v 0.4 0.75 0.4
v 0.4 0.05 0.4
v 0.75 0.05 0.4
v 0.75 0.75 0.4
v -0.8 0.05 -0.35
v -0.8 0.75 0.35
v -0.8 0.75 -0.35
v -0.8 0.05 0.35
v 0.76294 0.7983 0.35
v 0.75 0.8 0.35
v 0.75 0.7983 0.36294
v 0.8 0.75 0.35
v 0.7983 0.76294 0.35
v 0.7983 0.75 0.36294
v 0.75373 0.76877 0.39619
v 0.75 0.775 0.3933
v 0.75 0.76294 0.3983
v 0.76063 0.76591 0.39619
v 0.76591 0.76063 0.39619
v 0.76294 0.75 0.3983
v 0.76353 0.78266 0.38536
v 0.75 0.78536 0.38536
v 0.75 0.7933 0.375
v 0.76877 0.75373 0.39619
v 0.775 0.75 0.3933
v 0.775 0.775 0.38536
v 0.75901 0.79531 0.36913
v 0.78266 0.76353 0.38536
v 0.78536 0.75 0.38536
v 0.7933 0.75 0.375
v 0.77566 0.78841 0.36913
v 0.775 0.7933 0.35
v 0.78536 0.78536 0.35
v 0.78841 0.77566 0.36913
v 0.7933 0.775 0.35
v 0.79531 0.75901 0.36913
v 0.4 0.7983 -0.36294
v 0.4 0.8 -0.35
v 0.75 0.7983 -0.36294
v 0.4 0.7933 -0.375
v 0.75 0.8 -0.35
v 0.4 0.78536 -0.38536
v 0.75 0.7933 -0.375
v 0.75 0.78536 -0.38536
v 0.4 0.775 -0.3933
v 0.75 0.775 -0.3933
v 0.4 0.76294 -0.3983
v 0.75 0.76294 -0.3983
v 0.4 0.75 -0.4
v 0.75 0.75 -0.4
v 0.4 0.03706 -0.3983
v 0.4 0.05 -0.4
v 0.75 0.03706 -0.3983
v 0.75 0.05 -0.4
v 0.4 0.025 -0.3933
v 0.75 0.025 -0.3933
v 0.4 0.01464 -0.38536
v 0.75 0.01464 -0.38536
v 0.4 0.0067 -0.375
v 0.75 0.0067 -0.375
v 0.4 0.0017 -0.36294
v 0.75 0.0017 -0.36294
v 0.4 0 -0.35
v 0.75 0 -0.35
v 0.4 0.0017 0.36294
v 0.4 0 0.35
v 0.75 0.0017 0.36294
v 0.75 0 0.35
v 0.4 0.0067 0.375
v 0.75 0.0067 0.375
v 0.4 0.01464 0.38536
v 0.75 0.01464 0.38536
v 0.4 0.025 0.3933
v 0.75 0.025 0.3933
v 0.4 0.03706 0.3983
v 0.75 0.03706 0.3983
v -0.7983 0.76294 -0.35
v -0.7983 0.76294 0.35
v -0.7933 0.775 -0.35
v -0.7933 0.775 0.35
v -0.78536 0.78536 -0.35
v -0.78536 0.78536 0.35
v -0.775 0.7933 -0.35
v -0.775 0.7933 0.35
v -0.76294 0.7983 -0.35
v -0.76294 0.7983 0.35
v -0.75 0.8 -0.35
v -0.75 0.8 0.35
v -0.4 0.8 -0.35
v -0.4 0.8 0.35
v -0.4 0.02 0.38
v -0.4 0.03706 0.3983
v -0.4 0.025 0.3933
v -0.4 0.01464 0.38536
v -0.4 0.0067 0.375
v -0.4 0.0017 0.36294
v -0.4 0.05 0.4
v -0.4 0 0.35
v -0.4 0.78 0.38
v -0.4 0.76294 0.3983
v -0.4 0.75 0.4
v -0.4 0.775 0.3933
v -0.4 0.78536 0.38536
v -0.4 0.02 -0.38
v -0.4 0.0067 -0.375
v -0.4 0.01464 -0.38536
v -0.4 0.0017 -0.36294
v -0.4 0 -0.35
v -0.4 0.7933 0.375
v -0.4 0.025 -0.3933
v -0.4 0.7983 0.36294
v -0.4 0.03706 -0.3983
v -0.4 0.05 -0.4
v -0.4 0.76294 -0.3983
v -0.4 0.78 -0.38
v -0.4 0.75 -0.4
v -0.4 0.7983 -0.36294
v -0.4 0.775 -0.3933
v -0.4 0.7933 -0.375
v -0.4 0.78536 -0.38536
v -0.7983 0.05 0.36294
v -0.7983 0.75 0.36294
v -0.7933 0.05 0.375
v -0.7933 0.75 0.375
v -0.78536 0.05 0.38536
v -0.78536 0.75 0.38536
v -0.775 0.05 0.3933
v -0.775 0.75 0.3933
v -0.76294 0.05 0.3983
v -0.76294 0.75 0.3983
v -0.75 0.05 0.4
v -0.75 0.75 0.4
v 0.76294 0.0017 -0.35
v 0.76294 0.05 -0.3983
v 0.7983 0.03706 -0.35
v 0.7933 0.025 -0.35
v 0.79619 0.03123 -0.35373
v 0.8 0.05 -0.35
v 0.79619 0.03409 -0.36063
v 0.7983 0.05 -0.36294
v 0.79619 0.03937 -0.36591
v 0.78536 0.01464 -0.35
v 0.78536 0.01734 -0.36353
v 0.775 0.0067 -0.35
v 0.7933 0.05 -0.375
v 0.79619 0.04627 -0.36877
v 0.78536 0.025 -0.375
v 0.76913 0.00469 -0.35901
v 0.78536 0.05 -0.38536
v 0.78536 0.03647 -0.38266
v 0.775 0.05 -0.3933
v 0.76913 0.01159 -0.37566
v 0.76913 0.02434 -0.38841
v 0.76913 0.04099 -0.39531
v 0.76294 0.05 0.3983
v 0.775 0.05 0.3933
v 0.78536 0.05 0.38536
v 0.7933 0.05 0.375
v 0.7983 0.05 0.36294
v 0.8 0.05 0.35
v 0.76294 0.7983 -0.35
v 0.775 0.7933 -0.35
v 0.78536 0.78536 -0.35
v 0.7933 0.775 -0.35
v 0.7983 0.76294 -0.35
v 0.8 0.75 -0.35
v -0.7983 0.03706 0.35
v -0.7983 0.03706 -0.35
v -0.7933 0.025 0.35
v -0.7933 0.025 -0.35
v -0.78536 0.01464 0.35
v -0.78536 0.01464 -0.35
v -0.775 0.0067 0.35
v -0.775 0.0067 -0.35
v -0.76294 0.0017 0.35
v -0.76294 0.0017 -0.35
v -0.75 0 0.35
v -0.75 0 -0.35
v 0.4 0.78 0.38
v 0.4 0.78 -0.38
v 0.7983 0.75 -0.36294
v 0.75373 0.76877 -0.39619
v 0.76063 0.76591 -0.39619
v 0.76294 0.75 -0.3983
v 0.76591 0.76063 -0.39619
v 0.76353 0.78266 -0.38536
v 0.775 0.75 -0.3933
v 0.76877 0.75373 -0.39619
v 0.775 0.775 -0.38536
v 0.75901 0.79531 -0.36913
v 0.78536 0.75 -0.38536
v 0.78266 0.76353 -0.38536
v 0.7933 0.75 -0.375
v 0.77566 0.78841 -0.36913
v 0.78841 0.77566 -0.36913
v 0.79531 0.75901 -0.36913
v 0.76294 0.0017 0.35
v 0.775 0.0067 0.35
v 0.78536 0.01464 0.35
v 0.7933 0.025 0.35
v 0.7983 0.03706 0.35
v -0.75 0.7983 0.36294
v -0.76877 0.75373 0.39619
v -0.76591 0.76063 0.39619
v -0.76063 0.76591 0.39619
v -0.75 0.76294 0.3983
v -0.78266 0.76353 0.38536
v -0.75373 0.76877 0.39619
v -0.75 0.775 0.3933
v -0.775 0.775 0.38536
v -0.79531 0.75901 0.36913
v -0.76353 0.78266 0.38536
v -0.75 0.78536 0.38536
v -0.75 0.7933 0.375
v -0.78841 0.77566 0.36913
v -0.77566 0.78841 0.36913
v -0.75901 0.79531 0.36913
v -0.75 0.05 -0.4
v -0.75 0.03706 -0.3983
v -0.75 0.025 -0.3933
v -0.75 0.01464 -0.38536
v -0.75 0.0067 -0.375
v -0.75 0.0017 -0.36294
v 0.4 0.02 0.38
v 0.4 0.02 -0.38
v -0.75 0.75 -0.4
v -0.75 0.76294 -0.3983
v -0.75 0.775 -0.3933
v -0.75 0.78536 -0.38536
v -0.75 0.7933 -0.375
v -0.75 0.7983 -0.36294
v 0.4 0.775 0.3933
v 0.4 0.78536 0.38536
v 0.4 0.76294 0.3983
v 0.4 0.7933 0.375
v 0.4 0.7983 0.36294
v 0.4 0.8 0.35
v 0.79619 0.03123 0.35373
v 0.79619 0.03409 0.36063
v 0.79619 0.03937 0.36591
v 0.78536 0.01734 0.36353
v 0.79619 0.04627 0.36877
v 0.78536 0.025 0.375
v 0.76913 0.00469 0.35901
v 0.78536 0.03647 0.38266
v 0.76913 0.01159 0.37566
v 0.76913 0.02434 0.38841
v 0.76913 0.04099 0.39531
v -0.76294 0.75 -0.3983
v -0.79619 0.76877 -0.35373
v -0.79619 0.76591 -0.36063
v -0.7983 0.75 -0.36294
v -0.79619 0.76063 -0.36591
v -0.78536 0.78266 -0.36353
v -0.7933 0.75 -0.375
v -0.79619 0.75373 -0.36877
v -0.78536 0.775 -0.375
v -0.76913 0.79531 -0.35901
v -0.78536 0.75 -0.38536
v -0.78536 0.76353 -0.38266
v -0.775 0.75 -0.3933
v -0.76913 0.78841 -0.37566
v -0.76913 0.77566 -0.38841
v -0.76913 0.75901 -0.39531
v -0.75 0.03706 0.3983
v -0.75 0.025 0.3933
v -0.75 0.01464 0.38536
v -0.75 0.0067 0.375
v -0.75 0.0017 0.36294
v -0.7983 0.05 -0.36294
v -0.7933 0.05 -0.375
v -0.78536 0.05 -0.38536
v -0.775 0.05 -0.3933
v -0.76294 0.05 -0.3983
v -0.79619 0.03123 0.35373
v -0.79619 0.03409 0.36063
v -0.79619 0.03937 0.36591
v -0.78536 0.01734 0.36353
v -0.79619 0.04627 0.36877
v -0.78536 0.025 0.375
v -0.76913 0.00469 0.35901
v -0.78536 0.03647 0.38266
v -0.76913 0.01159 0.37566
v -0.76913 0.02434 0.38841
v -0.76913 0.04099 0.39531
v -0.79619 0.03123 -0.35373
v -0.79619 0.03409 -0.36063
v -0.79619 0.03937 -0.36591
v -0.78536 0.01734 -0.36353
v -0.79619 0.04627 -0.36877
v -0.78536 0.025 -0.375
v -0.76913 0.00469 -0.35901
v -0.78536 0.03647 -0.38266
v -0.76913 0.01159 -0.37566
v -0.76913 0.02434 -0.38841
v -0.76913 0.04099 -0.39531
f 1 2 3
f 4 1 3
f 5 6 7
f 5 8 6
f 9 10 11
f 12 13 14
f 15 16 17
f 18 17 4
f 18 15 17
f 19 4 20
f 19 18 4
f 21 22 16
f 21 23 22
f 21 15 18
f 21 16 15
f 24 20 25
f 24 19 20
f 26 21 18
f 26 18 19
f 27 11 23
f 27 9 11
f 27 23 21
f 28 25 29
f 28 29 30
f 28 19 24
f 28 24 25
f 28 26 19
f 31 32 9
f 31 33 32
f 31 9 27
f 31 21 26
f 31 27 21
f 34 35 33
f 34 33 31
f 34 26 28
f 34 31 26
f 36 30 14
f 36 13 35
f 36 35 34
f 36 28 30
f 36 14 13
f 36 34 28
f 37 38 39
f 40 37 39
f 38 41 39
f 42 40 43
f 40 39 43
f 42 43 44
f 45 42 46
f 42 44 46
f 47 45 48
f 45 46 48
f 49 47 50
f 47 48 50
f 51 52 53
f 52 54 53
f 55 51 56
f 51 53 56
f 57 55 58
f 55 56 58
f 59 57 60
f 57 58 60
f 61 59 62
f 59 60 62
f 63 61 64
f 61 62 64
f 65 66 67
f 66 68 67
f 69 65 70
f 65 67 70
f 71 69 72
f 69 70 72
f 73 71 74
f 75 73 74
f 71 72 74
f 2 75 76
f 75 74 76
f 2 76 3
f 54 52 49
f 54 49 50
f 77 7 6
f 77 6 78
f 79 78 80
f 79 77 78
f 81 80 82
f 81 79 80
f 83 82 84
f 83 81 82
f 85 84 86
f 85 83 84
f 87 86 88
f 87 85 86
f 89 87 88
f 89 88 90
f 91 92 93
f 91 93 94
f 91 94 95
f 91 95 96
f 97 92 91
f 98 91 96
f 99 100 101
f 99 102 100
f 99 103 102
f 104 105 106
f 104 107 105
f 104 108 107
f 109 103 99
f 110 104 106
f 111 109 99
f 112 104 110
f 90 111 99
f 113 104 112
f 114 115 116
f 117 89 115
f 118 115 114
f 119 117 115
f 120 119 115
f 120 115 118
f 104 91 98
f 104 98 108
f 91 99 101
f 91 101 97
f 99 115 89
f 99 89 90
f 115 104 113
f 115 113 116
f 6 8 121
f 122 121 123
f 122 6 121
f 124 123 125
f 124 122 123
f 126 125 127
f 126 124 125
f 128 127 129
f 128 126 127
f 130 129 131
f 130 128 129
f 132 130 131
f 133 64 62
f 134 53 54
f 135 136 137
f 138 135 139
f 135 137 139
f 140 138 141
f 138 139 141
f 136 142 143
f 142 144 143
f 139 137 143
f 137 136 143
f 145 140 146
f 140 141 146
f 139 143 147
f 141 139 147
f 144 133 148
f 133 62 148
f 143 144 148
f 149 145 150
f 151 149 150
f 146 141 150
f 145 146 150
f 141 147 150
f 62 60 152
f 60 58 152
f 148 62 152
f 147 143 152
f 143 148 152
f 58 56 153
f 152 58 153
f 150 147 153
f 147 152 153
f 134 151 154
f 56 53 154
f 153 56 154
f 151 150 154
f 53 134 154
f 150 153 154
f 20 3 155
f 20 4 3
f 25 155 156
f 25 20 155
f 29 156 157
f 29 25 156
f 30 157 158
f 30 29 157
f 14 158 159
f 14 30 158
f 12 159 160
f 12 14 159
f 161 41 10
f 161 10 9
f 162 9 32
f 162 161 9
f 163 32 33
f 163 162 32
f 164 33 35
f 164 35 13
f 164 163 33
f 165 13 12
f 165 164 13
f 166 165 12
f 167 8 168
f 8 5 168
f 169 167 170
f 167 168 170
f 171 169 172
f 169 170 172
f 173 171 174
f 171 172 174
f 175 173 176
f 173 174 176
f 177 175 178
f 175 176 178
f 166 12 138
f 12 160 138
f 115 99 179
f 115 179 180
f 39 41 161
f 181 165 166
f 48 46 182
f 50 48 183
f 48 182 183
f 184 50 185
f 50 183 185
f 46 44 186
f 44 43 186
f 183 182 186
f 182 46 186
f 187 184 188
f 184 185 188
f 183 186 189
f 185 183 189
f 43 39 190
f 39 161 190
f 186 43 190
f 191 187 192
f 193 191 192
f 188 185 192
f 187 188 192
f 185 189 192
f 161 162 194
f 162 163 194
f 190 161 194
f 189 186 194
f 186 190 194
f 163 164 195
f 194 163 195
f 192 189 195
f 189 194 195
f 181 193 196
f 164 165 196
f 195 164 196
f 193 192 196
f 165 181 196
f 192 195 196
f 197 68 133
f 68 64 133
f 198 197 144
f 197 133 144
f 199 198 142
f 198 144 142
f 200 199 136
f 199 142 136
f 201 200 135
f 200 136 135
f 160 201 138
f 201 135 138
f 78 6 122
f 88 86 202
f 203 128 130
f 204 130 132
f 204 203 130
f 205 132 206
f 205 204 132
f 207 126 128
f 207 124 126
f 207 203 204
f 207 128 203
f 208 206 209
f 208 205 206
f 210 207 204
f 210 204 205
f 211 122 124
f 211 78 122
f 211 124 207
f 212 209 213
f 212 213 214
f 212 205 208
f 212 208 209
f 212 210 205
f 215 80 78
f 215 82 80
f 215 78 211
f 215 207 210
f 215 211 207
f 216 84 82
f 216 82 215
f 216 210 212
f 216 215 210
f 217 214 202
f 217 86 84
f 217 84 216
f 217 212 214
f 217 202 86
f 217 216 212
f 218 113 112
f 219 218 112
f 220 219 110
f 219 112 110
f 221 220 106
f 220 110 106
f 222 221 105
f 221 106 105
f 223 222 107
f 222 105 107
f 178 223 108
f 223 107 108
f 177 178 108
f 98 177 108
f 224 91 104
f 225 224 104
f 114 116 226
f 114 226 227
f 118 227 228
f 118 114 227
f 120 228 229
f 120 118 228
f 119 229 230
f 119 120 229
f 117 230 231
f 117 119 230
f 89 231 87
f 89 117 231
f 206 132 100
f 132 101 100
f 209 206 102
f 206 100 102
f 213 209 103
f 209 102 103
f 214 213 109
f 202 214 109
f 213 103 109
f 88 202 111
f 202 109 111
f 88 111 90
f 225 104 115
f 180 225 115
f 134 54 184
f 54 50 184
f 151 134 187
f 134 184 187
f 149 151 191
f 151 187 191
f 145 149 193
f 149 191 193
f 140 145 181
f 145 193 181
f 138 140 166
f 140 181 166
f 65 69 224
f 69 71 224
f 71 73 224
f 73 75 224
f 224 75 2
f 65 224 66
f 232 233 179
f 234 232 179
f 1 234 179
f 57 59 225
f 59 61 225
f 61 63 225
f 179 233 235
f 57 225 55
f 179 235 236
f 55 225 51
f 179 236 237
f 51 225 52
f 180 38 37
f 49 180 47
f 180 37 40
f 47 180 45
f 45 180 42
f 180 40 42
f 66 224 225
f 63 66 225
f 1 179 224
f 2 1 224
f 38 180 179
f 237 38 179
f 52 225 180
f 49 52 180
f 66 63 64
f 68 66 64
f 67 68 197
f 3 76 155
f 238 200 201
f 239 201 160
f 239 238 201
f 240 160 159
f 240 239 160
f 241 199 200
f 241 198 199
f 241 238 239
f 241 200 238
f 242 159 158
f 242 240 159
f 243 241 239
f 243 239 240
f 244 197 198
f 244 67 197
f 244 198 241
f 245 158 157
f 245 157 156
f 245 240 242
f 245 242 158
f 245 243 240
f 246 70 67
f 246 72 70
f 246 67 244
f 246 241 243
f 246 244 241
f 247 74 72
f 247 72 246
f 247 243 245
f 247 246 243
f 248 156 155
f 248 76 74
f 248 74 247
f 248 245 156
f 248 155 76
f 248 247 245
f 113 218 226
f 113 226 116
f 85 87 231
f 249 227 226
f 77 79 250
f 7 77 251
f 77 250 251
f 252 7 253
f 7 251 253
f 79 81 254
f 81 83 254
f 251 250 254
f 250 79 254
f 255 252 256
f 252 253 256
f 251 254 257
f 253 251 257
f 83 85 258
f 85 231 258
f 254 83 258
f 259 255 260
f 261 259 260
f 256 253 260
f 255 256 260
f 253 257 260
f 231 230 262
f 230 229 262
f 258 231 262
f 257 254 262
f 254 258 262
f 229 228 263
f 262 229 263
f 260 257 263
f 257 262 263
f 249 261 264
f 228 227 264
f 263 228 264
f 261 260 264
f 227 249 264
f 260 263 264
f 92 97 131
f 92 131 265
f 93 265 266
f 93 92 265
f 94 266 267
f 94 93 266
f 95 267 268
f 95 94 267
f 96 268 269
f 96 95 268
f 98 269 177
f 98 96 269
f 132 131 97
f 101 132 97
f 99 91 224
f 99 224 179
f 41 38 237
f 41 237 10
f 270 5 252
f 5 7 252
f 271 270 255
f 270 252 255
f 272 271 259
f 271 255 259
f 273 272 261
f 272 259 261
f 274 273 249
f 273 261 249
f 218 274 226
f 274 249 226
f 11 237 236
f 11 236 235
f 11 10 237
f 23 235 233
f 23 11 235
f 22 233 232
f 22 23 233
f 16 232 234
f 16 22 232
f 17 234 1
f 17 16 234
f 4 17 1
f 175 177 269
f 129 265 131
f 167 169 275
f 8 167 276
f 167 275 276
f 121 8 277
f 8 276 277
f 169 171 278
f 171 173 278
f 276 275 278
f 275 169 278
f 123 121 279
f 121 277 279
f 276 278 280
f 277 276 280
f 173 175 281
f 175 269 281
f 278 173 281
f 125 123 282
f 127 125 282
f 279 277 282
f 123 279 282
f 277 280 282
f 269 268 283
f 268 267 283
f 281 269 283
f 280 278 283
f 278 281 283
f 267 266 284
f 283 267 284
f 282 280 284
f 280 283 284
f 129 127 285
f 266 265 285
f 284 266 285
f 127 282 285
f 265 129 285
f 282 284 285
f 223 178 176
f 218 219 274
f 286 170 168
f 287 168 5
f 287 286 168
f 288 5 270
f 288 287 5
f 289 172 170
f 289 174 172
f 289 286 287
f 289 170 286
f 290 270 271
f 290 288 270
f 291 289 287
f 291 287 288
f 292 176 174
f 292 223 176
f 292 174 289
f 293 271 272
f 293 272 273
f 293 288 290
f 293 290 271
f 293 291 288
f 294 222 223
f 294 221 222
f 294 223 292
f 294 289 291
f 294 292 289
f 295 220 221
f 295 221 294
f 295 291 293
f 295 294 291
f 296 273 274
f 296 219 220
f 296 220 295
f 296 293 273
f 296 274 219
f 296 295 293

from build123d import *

# Parameters (mm, degrees)
SKETCH1_W               = 1.6
SKETCH1_H               = 0.8
BOSS_EXTRUDE1_DEPTH     = 0.8
CUT_EXTRUDE1_DEPTH      = 0.4
CUT_EXTRUDE1_DEPTH_BACK = 0.4
SKETCH2_OUTSIDE_W       = 3.192
SKETCH2_OUTSIDE_H       = 3.192
SKETCH2_OUTSIDE_W_2     = 0.76
SKETCH2_OUTSIDE_H_2     = 0.76
FILLET1_R               = 0.05


with BuildPart() as part:
    # Sketch1 → Boss-Extrude1 (new body)
    with BuildSketch(Plane(origin=(0, 0, 0), x_dir=(1, 0, 0), z_dir=(0, 1, 0))):
        Rectangle(SKETCH1_W, SKETCH1_H)
    extrude(amount=BOSS_EXTRUDE1_DEPTH)

    # Sketch2 outside → Cut-Extrude1 (cut, two sides: drawn at the far end of the back side and taken through both)
    with BuildSketch(Plane(origin=(0, 0, 0), x_dir=(0, 0, -1), z_dir=(1, 0, 0)).offset(-CUT_EXTRUDE1_DEPTH_BACK)):
        with Locations((0, 0.4)):
            Rectangle(SKETCH2_OUTSIDE_W, SKETCH2_OUTSIDE_H)
        with Locations((0, 0.4)):
            Rectangle(SKETCH2_OUTSIDE_W_2, SKETCH2_OUTSIDE_H_2, mode=Mode.SUBTRACT)
    extrude(amount=CUT_EXTRUDE1_DEPTH + CUT_EXTRUDE1_DEPTH_BACK, mode=Mode.SUBTRACT)

    # Fillet1
    fillet1_edges = [part.edges().sort_by_distance(p)[0] for p in [
        (0.8, 0.8, 0),
        (-0.6, 0, -0.4),
        (0.6, 0, 0.4),
        (0.6, 0.8, -0.4),
        (0.6, 0.8, 0.4),
        (-0.6, 0.8, -0.4),
        (-0.8, 0.8, 0),
        (0.6, 0, -0.4),
        (0.8, 0, 0),
        (-0.6, 0, 0.4),
        (-0.8, 0, 0),
        (-0.8, 0.4, -0.4),
        (0.8, 0.4, -0.4),
        (0.8, 0.4, 0.4),
        (-0.8, 0.4, 0.4),
        (-0.6, 0.8, 0.4),
    ]]
    fillet(fillet1_edges, radius=FILLET1_R)


solid = part.part
